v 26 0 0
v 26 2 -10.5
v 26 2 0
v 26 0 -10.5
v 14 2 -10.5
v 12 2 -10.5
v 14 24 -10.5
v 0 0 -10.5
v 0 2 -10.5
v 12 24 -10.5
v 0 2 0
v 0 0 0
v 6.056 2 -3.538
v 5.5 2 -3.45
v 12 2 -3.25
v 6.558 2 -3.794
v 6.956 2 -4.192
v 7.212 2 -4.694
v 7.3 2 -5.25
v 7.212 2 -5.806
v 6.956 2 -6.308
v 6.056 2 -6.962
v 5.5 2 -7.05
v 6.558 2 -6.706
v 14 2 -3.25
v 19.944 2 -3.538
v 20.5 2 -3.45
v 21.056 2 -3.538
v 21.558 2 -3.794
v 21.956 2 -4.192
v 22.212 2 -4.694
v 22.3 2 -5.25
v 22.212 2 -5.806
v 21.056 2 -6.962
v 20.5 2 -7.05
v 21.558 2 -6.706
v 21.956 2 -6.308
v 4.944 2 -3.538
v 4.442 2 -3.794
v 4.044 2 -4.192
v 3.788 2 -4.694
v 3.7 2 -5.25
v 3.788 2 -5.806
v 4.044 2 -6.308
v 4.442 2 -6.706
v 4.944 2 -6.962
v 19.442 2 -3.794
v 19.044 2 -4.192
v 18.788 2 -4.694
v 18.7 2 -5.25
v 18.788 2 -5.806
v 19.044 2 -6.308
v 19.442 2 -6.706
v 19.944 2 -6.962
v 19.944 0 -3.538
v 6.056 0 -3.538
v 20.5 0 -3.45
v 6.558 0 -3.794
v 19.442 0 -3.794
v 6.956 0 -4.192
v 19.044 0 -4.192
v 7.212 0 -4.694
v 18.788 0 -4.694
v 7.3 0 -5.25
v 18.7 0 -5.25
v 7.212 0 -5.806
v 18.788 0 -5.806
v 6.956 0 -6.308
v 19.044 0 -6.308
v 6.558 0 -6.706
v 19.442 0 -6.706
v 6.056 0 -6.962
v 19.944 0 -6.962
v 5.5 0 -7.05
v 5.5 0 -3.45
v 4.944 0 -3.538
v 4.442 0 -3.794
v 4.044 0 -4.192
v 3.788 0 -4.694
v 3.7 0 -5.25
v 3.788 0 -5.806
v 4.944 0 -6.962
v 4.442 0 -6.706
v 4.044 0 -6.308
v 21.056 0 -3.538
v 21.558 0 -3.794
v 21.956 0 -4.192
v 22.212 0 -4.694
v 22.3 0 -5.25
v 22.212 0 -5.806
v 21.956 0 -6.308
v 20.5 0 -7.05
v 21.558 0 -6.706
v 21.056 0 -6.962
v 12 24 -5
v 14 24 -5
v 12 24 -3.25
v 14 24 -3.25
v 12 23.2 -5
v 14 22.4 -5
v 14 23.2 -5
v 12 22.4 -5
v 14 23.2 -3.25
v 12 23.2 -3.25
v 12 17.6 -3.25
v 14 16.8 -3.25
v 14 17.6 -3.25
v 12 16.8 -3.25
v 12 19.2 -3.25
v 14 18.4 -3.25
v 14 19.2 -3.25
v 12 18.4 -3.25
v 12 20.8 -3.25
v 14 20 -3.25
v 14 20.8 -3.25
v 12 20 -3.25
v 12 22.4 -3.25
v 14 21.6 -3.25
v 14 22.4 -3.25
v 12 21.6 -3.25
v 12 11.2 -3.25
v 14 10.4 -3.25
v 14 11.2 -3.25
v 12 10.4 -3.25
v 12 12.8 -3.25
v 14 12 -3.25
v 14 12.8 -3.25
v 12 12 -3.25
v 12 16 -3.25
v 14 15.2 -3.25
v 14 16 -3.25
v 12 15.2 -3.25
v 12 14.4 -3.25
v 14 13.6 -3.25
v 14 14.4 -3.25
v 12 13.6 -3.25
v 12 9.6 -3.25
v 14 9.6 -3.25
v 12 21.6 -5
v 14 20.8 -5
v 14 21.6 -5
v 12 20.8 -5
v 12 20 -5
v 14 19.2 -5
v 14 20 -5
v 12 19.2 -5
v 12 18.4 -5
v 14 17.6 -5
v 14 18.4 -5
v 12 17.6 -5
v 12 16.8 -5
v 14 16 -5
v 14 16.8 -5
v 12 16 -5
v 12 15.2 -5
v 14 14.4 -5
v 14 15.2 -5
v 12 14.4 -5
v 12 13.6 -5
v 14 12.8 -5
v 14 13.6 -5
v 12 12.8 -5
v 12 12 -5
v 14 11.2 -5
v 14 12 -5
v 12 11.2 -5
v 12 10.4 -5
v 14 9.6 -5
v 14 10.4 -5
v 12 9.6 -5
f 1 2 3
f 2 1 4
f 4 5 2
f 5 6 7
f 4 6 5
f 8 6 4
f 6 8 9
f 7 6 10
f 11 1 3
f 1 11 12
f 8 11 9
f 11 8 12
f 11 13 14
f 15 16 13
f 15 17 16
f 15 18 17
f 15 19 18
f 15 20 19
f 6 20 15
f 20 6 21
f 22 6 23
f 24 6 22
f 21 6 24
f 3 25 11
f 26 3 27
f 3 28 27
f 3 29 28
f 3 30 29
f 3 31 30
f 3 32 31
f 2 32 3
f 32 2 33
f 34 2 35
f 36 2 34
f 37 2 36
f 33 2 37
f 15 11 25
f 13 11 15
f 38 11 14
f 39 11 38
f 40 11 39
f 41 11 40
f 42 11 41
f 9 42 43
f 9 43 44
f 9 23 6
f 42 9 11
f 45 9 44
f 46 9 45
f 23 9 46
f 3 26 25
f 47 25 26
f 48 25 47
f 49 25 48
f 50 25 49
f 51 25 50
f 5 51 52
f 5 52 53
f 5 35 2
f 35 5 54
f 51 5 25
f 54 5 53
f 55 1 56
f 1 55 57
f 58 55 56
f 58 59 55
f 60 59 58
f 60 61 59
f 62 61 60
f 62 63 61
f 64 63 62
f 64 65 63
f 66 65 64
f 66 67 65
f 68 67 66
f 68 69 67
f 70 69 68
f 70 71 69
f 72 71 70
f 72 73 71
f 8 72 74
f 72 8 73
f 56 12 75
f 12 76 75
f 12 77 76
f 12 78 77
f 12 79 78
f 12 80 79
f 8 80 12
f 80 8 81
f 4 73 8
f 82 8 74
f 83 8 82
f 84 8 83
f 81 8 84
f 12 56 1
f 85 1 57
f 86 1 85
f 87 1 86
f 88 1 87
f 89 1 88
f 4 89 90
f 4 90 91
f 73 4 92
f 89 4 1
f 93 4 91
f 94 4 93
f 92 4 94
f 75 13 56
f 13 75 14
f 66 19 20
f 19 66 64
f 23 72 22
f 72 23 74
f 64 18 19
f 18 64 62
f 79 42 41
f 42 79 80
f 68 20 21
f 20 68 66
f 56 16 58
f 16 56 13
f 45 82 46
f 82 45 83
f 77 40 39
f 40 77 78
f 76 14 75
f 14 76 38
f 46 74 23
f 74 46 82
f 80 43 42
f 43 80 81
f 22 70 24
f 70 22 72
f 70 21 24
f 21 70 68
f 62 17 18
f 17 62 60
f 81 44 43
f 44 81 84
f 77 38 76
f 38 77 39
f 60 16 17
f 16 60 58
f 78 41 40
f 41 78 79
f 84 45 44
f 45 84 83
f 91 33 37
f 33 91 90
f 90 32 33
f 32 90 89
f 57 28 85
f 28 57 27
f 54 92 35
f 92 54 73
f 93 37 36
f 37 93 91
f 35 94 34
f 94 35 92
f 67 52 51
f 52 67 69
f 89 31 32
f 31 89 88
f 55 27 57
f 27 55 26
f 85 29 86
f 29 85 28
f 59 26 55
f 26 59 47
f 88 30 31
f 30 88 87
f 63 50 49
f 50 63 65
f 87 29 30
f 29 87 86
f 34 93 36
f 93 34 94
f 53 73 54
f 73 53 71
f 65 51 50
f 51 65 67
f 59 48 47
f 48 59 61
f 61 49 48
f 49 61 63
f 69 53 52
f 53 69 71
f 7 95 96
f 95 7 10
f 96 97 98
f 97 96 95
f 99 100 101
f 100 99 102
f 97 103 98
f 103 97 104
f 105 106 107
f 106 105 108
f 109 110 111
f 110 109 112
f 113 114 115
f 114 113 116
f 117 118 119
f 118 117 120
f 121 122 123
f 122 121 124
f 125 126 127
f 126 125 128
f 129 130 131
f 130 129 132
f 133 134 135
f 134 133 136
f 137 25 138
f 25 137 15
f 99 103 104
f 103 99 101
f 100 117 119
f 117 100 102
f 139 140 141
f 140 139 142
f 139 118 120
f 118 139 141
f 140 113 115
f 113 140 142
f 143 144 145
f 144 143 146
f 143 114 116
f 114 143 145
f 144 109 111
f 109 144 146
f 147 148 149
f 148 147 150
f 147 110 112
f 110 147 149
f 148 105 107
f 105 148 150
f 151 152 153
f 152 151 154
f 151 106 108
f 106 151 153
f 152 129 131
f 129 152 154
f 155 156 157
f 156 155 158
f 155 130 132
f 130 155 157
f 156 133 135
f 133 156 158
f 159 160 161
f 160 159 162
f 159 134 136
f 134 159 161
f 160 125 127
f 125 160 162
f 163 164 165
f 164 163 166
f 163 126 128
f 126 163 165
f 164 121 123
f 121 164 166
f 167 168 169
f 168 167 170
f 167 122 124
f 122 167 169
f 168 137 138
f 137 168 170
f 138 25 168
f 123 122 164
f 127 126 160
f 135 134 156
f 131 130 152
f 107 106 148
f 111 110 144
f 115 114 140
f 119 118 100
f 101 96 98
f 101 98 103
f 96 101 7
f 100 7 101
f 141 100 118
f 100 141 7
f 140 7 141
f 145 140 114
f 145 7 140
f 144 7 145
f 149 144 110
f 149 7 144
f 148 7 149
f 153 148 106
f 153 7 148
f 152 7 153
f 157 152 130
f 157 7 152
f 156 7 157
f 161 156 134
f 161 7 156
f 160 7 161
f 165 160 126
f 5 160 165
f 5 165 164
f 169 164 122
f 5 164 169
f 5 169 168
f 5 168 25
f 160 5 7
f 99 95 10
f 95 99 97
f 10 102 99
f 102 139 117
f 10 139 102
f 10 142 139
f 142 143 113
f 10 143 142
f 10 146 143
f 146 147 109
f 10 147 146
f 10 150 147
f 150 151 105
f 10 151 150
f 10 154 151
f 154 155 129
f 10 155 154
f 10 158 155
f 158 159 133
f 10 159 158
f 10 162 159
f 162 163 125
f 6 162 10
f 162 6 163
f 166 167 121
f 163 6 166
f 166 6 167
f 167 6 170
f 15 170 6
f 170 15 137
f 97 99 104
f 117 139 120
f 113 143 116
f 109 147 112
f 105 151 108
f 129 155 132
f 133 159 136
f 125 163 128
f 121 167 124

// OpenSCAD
//  Hinged Extruder Tension Guage Customizable
//
//  It was always a guessing game when setting
//  the tension on my extruder.  I would get it 
//  set where I like it.  Then for some reason
//  have to take apart the extruder.  Getting the 
//  tension back to the exact level was not easy.
//  So I created this little gauge so when I 
//  loosen the hinge I can set it back exactly
//  where it was.
//
//  Once installed and you get the tension where
//  you like it.  Just make a mark so you will 
//  have a visual cue.
//
//  I have tested this on the Prusa i3 Rework 
//  Extruder Upgrade.
//  http://www.thingiverse.com/thing:291291
// 
//  Problem solved.
//  
//  I printed in PLA .2 layer height
//
//  aBrainDump.com
//
//
//


// Arm length
armlength = 24; 

// Distance between mounting holes
mountholedistance = 15;

// Mounting bracket height
mountheight = 10.5;

// Mounting bracket thickness
mountthickness = 2;

// Tooth gap in mm
tooth = .8;

/* [Hidden] */

$fn=20;

mirror([0,0,1])
gauge();

module gauge()
{

difference()
{
cube([mountholedistance+11,mountthickness,mountheight]);

rotate([90])
translate([11/2,mountheight/2,-mountthickness])
cylinder(h=mountthickness+2,r=3.6/2);

rotate([90])
translate([(mountholedistance+11)-(11/2),mountheight/2,-mountthickness])
cylinder(h=mountthickness+2,r=3.6/2);
}

//center gauge
difference()
{
translate([(mountholedistance+11-(mountthickness))/2,0,(mountheight/2)-mountthickness])
cube([mountthickness,armlength,(mountheight/2)+2]);

for (step = [1:tooth*2:armlength/1.5]) {
     translate([(mountholedistance+11-(mountthickness)*2)/2,armlength-step+1,(mountheight/2)-mountthickness])
     cube([mountthickness*2,tooth,mountheight/6]);


}

//edge guage
//difference()
//{
//translate([(mountholedistance+11),0,mountheight/2])
//cube([mountthickness,armlength,mountheight/2]);
//
//for (step = [armlength:2:armlength/2]) {
//     translate([(mountholedistance+11),step+1,(mountheight/2)+3])
//     cube([mountthickness,1,mountheight/3]);
//}

}

}
